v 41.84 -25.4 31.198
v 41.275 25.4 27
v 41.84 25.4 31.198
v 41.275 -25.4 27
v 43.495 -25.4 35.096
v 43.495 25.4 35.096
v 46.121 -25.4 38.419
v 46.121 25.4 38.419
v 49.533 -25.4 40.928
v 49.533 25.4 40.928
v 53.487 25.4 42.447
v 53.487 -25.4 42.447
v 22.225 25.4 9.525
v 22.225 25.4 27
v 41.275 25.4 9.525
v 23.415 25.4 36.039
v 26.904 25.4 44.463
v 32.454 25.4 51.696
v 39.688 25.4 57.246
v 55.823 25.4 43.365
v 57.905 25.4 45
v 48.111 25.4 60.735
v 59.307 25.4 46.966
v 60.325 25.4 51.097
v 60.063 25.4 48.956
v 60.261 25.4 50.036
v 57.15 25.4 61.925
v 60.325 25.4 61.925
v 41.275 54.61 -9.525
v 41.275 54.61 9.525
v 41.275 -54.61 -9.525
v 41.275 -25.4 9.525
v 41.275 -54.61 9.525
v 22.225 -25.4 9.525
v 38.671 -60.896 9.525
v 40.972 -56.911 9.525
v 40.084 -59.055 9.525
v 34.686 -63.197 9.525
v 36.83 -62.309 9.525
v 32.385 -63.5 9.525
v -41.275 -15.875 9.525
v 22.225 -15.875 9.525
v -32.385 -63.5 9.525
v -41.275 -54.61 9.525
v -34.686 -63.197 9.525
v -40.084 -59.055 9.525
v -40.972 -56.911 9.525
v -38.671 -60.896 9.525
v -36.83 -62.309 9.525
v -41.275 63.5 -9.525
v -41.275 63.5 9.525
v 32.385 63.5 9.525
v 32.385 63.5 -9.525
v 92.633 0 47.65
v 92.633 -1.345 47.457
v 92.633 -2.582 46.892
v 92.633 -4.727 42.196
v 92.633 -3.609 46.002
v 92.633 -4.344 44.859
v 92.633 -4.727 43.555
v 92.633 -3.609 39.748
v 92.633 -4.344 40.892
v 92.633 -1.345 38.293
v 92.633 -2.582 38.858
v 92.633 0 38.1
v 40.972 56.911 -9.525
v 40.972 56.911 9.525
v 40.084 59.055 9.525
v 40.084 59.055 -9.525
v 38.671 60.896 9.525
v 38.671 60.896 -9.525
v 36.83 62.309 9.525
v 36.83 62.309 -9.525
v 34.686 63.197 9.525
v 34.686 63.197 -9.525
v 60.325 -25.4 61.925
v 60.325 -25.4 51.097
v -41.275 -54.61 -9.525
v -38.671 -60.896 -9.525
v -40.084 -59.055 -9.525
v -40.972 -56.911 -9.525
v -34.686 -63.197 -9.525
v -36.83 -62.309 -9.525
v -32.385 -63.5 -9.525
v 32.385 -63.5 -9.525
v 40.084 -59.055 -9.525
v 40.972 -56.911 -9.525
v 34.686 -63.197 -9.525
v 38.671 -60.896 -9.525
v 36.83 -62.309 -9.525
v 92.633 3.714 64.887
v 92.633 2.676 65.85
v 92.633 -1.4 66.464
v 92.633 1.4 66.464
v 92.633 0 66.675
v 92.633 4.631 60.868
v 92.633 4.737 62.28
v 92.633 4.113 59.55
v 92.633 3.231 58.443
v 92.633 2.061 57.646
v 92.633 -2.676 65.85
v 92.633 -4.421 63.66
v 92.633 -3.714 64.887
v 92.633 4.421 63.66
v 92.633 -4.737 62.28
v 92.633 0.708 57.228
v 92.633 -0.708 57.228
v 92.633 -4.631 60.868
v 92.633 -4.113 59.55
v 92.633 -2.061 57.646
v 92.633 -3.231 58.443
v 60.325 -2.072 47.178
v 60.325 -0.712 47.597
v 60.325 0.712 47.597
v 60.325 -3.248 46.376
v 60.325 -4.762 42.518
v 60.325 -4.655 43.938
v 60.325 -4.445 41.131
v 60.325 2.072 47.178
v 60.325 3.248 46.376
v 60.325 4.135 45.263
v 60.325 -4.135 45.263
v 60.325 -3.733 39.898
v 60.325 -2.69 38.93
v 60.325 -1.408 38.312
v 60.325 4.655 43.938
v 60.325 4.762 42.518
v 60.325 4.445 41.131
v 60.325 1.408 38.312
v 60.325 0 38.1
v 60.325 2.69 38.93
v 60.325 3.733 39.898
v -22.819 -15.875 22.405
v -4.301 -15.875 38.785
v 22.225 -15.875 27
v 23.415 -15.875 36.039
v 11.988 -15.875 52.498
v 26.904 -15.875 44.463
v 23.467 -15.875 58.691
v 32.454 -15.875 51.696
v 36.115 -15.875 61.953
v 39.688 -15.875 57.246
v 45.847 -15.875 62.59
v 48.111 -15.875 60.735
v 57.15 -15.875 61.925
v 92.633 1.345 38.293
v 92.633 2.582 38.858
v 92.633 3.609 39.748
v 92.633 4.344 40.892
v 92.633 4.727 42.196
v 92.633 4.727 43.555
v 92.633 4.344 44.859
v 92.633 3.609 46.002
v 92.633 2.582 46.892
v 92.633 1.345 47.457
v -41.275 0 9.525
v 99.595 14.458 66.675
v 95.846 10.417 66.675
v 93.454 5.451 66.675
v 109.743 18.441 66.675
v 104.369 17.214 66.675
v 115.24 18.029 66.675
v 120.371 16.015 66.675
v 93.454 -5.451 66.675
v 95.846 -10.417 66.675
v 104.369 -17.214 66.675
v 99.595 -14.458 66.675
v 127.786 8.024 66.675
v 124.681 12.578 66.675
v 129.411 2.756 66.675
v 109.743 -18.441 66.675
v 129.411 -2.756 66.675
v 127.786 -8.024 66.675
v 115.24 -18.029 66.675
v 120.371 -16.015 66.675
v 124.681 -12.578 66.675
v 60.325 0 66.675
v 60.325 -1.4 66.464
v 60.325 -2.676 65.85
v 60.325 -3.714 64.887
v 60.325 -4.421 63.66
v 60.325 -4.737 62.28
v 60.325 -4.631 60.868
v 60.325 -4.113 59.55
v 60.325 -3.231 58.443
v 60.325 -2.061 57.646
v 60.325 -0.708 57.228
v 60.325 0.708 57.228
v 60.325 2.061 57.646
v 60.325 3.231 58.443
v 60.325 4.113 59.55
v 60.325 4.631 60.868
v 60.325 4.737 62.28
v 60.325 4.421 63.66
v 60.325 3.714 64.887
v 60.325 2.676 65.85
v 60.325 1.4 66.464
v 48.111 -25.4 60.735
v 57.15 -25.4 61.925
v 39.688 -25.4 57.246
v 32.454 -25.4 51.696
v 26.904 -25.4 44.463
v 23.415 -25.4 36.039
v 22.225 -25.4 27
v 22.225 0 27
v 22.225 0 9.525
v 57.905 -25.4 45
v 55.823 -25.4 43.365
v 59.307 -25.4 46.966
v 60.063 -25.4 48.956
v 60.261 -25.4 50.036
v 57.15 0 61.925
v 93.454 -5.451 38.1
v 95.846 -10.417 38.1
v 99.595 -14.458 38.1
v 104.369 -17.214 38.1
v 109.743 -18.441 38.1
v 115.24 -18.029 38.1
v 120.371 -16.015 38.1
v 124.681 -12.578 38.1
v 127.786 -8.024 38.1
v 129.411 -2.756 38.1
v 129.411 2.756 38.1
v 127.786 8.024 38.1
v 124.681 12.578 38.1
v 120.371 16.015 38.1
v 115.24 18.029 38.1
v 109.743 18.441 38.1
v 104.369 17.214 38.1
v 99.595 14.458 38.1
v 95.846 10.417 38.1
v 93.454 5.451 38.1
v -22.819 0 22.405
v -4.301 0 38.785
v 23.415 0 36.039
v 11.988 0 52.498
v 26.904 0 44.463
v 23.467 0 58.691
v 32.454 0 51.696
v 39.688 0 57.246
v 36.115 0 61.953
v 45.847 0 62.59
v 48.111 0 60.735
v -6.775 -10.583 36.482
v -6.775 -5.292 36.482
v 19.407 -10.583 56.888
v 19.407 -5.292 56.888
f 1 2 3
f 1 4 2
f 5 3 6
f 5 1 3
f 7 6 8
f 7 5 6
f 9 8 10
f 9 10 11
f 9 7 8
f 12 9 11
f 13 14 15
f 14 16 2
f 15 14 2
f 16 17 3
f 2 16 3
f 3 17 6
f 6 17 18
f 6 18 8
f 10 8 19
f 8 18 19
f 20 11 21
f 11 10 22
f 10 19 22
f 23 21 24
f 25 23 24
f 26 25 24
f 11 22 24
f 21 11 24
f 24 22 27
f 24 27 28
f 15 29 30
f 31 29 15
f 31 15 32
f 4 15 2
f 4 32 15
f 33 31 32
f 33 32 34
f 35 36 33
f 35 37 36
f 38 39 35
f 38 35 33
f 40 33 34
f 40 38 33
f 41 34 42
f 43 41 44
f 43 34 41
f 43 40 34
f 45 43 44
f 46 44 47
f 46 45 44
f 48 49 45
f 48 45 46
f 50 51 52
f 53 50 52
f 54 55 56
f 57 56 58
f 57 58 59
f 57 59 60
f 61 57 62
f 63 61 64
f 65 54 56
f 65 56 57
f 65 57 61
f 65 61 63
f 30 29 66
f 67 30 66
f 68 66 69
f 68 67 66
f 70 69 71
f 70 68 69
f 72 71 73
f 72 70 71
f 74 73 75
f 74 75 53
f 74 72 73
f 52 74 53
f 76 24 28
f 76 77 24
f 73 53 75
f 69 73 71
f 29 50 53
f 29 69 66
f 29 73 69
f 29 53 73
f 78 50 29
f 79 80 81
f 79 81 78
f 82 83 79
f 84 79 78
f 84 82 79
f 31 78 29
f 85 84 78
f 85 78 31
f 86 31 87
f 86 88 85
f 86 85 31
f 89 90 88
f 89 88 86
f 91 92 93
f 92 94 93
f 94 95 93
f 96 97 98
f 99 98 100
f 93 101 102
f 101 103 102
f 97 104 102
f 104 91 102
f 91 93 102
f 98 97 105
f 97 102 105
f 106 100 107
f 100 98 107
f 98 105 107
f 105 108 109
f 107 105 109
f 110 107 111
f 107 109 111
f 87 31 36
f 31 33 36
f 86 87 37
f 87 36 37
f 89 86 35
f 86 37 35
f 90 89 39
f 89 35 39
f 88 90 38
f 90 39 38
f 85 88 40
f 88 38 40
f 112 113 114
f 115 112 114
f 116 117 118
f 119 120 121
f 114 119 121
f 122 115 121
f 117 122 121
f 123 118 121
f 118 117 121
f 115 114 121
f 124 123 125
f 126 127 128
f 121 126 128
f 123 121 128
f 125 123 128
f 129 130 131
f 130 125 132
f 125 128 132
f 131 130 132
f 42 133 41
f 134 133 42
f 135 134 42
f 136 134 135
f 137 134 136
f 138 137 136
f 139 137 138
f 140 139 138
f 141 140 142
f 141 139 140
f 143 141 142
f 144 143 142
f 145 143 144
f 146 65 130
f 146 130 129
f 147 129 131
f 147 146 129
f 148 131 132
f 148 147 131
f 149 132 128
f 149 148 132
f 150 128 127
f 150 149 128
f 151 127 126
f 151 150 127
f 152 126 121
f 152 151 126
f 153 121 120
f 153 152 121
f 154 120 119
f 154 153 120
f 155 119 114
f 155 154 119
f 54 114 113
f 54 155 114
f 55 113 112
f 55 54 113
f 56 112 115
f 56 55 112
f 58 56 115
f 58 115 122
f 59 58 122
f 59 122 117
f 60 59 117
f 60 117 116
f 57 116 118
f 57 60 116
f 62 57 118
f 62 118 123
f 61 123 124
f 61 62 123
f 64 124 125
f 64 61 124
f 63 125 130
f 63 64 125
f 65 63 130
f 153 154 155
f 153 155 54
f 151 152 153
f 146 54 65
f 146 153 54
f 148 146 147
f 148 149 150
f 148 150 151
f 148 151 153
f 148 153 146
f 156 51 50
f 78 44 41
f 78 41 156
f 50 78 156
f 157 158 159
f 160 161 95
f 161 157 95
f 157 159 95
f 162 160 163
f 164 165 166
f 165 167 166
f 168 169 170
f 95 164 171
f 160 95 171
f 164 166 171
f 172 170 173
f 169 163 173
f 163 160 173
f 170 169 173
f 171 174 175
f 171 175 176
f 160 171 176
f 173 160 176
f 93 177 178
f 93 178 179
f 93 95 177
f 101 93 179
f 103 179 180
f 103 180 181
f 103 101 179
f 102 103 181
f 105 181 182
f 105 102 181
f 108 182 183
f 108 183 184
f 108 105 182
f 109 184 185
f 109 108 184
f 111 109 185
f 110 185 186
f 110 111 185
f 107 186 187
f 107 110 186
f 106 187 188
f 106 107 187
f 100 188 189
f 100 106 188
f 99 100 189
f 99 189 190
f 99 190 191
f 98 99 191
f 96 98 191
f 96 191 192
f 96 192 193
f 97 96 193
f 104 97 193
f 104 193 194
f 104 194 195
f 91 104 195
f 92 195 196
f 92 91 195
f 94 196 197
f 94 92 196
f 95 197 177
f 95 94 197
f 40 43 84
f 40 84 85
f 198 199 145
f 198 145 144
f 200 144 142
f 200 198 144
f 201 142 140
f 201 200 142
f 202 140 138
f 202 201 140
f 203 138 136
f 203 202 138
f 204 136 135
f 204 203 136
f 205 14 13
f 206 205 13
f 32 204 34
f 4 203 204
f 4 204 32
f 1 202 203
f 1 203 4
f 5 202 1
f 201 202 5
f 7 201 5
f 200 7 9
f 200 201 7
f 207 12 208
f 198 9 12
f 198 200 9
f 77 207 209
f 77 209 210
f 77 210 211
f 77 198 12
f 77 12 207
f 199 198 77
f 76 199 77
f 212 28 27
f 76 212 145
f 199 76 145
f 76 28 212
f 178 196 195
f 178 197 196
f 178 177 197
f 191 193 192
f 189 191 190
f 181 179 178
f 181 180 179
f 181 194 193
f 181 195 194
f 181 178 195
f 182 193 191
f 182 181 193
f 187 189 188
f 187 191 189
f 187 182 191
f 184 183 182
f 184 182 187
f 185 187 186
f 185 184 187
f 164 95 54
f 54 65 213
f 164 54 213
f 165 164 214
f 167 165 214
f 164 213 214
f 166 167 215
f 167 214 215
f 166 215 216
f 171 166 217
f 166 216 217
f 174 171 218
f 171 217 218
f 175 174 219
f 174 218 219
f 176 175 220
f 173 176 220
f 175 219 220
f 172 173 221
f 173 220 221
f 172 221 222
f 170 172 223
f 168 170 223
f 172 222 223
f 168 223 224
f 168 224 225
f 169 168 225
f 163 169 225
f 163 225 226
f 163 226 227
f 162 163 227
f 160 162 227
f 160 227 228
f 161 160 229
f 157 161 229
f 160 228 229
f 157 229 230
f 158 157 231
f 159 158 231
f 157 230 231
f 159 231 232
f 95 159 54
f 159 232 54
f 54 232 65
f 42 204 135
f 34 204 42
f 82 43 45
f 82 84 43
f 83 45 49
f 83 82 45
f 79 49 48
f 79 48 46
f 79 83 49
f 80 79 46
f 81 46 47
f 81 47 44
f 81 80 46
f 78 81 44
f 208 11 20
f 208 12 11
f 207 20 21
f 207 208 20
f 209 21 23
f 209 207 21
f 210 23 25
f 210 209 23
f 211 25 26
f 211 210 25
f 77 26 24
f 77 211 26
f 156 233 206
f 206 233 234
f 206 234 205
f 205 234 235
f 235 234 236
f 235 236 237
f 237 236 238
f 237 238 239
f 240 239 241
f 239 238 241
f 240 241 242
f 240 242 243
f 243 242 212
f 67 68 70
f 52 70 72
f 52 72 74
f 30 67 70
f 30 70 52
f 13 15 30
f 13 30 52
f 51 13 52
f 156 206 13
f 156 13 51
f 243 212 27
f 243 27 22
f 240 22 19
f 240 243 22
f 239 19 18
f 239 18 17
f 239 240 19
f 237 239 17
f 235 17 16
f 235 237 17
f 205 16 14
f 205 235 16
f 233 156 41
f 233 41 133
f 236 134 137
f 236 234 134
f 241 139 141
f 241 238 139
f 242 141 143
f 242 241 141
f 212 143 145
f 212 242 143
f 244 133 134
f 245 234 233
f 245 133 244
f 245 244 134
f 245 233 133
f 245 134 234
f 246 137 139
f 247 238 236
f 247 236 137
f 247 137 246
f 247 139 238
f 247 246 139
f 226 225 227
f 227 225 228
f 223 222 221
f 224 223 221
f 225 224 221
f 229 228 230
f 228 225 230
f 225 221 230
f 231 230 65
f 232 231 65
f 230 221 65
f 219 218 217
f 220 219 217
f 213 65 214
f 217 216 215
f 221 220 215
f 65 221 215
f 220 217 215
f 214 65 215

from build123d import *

# Parameters (mm, degrees)
F1_DEPTH = 63.5
F2_DEPTH = 25.4
F3_DEPTH = 15.875
F5_R     = 8.89
F0_W     = 32.307704
F0_H     = 4.7752
F0_H_2   = 4.7498


with BuildPart() as f1:
    # F0 (on Front) → F1 (new body, symmetric)
    with BuildSketch(Plane.XZ):
        Polygon((41.275, -9.525), (41.275, 9.525), (22.225, 9.525), (-41.275, 9.525), (-41.275, -9.525), align=None)
    extrude(amount=F1_DEPTH, both=True)

    # F0 (on Front) → F2 (join, symmetric)
    with BuildSketch(Plane.XZ):
        with BuildLine():
            Line((22.225, 9.525), (41.275, 9.525))
            Line((41.275, 9.525), (41.275, 27.0002))
            ThreePointArc((41.275, 27.0002), (45.92468, 38.22552), (57.15, 42.8752))
            Line((57.15, 42.8752), (60.325, 42.8752))
            Line((60.325, 42.8752), (60.325, 61.9252))
            Line((60.325, 61.9252), (57.15, 61.9252))
            ThreePointArc((57.15, 61.9252), (32.454296, 51.695904), (22.225, 27.0002))
            Line((22.225, 27.0002), (22.225, 9.525))
        make_face()
    extrude(amount=F2_DEPTH, both=True)

    # F0 (on Front) → F3 (join)
    with BuildSketch(Plane.XZ):
        with BuildLine():
            Line((-41.275, 9.525), (22.225, 9.525))
            Line((22.225, 9.525), (22.225, 27.0002))
            ThreePointArc((22.225, 27.0002), (32.454296, 51.695904), (57.15, 61.9252))
            add(Edge.make_bspline(
                [(-41.275, 9.525), (4.012068, 36.818478), (6.998443, 67.511775), (57.15, 61.9252)],
                knots=[0, 0, 0, 0, 111.504536, 111.504536, 111.504536, 111.504536], degree=3))
        make_face()
    extrude(amount=F3_DEPTH)

    # F5
    f5_edges = [f1.edges().sort_by_distance(p)[0] for p in [
        (41.275, -63.5, 0),
        (-41.275, -63.5, 0),
        (41.275, 63.5, 0),
        (60.325, 0, 42.8752),
    ]]
    fillet(f5_edges, radius=F5_R)


with BuildPart() as f4:
    # F0 (on Front) → F4 (revolve)
    with BuildSketch(Plane.XZ):
        Polygon((92.632704, 61.9252), (92.632704, 42.8752), (92.632704, 38.1), (111.125, 38.1), (111.125, 66.675), (92.632704, 66.675), align=None)
    revolve(axis=Axis((111.125, 0, 52.3875), (0, 0, 1)))

    # F0 (on Front) → F6 (revolve)
    with BuildSketch(Plane.XZ):
        with Locations((76.478852, 40.4876)):
            Rectangle(F0_W, F0_H)
    revolve(axis=Axis((74.891352, 0, 42.8752), (1, 0, 0)))


with BuildPart() as f7:
    # F0 (on Front) → F7 (revolve)
    with BuildSketch(Plane.XZ):
        with Locations((76.478852, 64.3001)):
            Rectangle(F0_W, F0_H_2)
    revolve(axis=Axis((74.891352, 0, 61.9252), (1, 0, 0)))


solid = Compound([f1.part, f4.part, f7.part])
